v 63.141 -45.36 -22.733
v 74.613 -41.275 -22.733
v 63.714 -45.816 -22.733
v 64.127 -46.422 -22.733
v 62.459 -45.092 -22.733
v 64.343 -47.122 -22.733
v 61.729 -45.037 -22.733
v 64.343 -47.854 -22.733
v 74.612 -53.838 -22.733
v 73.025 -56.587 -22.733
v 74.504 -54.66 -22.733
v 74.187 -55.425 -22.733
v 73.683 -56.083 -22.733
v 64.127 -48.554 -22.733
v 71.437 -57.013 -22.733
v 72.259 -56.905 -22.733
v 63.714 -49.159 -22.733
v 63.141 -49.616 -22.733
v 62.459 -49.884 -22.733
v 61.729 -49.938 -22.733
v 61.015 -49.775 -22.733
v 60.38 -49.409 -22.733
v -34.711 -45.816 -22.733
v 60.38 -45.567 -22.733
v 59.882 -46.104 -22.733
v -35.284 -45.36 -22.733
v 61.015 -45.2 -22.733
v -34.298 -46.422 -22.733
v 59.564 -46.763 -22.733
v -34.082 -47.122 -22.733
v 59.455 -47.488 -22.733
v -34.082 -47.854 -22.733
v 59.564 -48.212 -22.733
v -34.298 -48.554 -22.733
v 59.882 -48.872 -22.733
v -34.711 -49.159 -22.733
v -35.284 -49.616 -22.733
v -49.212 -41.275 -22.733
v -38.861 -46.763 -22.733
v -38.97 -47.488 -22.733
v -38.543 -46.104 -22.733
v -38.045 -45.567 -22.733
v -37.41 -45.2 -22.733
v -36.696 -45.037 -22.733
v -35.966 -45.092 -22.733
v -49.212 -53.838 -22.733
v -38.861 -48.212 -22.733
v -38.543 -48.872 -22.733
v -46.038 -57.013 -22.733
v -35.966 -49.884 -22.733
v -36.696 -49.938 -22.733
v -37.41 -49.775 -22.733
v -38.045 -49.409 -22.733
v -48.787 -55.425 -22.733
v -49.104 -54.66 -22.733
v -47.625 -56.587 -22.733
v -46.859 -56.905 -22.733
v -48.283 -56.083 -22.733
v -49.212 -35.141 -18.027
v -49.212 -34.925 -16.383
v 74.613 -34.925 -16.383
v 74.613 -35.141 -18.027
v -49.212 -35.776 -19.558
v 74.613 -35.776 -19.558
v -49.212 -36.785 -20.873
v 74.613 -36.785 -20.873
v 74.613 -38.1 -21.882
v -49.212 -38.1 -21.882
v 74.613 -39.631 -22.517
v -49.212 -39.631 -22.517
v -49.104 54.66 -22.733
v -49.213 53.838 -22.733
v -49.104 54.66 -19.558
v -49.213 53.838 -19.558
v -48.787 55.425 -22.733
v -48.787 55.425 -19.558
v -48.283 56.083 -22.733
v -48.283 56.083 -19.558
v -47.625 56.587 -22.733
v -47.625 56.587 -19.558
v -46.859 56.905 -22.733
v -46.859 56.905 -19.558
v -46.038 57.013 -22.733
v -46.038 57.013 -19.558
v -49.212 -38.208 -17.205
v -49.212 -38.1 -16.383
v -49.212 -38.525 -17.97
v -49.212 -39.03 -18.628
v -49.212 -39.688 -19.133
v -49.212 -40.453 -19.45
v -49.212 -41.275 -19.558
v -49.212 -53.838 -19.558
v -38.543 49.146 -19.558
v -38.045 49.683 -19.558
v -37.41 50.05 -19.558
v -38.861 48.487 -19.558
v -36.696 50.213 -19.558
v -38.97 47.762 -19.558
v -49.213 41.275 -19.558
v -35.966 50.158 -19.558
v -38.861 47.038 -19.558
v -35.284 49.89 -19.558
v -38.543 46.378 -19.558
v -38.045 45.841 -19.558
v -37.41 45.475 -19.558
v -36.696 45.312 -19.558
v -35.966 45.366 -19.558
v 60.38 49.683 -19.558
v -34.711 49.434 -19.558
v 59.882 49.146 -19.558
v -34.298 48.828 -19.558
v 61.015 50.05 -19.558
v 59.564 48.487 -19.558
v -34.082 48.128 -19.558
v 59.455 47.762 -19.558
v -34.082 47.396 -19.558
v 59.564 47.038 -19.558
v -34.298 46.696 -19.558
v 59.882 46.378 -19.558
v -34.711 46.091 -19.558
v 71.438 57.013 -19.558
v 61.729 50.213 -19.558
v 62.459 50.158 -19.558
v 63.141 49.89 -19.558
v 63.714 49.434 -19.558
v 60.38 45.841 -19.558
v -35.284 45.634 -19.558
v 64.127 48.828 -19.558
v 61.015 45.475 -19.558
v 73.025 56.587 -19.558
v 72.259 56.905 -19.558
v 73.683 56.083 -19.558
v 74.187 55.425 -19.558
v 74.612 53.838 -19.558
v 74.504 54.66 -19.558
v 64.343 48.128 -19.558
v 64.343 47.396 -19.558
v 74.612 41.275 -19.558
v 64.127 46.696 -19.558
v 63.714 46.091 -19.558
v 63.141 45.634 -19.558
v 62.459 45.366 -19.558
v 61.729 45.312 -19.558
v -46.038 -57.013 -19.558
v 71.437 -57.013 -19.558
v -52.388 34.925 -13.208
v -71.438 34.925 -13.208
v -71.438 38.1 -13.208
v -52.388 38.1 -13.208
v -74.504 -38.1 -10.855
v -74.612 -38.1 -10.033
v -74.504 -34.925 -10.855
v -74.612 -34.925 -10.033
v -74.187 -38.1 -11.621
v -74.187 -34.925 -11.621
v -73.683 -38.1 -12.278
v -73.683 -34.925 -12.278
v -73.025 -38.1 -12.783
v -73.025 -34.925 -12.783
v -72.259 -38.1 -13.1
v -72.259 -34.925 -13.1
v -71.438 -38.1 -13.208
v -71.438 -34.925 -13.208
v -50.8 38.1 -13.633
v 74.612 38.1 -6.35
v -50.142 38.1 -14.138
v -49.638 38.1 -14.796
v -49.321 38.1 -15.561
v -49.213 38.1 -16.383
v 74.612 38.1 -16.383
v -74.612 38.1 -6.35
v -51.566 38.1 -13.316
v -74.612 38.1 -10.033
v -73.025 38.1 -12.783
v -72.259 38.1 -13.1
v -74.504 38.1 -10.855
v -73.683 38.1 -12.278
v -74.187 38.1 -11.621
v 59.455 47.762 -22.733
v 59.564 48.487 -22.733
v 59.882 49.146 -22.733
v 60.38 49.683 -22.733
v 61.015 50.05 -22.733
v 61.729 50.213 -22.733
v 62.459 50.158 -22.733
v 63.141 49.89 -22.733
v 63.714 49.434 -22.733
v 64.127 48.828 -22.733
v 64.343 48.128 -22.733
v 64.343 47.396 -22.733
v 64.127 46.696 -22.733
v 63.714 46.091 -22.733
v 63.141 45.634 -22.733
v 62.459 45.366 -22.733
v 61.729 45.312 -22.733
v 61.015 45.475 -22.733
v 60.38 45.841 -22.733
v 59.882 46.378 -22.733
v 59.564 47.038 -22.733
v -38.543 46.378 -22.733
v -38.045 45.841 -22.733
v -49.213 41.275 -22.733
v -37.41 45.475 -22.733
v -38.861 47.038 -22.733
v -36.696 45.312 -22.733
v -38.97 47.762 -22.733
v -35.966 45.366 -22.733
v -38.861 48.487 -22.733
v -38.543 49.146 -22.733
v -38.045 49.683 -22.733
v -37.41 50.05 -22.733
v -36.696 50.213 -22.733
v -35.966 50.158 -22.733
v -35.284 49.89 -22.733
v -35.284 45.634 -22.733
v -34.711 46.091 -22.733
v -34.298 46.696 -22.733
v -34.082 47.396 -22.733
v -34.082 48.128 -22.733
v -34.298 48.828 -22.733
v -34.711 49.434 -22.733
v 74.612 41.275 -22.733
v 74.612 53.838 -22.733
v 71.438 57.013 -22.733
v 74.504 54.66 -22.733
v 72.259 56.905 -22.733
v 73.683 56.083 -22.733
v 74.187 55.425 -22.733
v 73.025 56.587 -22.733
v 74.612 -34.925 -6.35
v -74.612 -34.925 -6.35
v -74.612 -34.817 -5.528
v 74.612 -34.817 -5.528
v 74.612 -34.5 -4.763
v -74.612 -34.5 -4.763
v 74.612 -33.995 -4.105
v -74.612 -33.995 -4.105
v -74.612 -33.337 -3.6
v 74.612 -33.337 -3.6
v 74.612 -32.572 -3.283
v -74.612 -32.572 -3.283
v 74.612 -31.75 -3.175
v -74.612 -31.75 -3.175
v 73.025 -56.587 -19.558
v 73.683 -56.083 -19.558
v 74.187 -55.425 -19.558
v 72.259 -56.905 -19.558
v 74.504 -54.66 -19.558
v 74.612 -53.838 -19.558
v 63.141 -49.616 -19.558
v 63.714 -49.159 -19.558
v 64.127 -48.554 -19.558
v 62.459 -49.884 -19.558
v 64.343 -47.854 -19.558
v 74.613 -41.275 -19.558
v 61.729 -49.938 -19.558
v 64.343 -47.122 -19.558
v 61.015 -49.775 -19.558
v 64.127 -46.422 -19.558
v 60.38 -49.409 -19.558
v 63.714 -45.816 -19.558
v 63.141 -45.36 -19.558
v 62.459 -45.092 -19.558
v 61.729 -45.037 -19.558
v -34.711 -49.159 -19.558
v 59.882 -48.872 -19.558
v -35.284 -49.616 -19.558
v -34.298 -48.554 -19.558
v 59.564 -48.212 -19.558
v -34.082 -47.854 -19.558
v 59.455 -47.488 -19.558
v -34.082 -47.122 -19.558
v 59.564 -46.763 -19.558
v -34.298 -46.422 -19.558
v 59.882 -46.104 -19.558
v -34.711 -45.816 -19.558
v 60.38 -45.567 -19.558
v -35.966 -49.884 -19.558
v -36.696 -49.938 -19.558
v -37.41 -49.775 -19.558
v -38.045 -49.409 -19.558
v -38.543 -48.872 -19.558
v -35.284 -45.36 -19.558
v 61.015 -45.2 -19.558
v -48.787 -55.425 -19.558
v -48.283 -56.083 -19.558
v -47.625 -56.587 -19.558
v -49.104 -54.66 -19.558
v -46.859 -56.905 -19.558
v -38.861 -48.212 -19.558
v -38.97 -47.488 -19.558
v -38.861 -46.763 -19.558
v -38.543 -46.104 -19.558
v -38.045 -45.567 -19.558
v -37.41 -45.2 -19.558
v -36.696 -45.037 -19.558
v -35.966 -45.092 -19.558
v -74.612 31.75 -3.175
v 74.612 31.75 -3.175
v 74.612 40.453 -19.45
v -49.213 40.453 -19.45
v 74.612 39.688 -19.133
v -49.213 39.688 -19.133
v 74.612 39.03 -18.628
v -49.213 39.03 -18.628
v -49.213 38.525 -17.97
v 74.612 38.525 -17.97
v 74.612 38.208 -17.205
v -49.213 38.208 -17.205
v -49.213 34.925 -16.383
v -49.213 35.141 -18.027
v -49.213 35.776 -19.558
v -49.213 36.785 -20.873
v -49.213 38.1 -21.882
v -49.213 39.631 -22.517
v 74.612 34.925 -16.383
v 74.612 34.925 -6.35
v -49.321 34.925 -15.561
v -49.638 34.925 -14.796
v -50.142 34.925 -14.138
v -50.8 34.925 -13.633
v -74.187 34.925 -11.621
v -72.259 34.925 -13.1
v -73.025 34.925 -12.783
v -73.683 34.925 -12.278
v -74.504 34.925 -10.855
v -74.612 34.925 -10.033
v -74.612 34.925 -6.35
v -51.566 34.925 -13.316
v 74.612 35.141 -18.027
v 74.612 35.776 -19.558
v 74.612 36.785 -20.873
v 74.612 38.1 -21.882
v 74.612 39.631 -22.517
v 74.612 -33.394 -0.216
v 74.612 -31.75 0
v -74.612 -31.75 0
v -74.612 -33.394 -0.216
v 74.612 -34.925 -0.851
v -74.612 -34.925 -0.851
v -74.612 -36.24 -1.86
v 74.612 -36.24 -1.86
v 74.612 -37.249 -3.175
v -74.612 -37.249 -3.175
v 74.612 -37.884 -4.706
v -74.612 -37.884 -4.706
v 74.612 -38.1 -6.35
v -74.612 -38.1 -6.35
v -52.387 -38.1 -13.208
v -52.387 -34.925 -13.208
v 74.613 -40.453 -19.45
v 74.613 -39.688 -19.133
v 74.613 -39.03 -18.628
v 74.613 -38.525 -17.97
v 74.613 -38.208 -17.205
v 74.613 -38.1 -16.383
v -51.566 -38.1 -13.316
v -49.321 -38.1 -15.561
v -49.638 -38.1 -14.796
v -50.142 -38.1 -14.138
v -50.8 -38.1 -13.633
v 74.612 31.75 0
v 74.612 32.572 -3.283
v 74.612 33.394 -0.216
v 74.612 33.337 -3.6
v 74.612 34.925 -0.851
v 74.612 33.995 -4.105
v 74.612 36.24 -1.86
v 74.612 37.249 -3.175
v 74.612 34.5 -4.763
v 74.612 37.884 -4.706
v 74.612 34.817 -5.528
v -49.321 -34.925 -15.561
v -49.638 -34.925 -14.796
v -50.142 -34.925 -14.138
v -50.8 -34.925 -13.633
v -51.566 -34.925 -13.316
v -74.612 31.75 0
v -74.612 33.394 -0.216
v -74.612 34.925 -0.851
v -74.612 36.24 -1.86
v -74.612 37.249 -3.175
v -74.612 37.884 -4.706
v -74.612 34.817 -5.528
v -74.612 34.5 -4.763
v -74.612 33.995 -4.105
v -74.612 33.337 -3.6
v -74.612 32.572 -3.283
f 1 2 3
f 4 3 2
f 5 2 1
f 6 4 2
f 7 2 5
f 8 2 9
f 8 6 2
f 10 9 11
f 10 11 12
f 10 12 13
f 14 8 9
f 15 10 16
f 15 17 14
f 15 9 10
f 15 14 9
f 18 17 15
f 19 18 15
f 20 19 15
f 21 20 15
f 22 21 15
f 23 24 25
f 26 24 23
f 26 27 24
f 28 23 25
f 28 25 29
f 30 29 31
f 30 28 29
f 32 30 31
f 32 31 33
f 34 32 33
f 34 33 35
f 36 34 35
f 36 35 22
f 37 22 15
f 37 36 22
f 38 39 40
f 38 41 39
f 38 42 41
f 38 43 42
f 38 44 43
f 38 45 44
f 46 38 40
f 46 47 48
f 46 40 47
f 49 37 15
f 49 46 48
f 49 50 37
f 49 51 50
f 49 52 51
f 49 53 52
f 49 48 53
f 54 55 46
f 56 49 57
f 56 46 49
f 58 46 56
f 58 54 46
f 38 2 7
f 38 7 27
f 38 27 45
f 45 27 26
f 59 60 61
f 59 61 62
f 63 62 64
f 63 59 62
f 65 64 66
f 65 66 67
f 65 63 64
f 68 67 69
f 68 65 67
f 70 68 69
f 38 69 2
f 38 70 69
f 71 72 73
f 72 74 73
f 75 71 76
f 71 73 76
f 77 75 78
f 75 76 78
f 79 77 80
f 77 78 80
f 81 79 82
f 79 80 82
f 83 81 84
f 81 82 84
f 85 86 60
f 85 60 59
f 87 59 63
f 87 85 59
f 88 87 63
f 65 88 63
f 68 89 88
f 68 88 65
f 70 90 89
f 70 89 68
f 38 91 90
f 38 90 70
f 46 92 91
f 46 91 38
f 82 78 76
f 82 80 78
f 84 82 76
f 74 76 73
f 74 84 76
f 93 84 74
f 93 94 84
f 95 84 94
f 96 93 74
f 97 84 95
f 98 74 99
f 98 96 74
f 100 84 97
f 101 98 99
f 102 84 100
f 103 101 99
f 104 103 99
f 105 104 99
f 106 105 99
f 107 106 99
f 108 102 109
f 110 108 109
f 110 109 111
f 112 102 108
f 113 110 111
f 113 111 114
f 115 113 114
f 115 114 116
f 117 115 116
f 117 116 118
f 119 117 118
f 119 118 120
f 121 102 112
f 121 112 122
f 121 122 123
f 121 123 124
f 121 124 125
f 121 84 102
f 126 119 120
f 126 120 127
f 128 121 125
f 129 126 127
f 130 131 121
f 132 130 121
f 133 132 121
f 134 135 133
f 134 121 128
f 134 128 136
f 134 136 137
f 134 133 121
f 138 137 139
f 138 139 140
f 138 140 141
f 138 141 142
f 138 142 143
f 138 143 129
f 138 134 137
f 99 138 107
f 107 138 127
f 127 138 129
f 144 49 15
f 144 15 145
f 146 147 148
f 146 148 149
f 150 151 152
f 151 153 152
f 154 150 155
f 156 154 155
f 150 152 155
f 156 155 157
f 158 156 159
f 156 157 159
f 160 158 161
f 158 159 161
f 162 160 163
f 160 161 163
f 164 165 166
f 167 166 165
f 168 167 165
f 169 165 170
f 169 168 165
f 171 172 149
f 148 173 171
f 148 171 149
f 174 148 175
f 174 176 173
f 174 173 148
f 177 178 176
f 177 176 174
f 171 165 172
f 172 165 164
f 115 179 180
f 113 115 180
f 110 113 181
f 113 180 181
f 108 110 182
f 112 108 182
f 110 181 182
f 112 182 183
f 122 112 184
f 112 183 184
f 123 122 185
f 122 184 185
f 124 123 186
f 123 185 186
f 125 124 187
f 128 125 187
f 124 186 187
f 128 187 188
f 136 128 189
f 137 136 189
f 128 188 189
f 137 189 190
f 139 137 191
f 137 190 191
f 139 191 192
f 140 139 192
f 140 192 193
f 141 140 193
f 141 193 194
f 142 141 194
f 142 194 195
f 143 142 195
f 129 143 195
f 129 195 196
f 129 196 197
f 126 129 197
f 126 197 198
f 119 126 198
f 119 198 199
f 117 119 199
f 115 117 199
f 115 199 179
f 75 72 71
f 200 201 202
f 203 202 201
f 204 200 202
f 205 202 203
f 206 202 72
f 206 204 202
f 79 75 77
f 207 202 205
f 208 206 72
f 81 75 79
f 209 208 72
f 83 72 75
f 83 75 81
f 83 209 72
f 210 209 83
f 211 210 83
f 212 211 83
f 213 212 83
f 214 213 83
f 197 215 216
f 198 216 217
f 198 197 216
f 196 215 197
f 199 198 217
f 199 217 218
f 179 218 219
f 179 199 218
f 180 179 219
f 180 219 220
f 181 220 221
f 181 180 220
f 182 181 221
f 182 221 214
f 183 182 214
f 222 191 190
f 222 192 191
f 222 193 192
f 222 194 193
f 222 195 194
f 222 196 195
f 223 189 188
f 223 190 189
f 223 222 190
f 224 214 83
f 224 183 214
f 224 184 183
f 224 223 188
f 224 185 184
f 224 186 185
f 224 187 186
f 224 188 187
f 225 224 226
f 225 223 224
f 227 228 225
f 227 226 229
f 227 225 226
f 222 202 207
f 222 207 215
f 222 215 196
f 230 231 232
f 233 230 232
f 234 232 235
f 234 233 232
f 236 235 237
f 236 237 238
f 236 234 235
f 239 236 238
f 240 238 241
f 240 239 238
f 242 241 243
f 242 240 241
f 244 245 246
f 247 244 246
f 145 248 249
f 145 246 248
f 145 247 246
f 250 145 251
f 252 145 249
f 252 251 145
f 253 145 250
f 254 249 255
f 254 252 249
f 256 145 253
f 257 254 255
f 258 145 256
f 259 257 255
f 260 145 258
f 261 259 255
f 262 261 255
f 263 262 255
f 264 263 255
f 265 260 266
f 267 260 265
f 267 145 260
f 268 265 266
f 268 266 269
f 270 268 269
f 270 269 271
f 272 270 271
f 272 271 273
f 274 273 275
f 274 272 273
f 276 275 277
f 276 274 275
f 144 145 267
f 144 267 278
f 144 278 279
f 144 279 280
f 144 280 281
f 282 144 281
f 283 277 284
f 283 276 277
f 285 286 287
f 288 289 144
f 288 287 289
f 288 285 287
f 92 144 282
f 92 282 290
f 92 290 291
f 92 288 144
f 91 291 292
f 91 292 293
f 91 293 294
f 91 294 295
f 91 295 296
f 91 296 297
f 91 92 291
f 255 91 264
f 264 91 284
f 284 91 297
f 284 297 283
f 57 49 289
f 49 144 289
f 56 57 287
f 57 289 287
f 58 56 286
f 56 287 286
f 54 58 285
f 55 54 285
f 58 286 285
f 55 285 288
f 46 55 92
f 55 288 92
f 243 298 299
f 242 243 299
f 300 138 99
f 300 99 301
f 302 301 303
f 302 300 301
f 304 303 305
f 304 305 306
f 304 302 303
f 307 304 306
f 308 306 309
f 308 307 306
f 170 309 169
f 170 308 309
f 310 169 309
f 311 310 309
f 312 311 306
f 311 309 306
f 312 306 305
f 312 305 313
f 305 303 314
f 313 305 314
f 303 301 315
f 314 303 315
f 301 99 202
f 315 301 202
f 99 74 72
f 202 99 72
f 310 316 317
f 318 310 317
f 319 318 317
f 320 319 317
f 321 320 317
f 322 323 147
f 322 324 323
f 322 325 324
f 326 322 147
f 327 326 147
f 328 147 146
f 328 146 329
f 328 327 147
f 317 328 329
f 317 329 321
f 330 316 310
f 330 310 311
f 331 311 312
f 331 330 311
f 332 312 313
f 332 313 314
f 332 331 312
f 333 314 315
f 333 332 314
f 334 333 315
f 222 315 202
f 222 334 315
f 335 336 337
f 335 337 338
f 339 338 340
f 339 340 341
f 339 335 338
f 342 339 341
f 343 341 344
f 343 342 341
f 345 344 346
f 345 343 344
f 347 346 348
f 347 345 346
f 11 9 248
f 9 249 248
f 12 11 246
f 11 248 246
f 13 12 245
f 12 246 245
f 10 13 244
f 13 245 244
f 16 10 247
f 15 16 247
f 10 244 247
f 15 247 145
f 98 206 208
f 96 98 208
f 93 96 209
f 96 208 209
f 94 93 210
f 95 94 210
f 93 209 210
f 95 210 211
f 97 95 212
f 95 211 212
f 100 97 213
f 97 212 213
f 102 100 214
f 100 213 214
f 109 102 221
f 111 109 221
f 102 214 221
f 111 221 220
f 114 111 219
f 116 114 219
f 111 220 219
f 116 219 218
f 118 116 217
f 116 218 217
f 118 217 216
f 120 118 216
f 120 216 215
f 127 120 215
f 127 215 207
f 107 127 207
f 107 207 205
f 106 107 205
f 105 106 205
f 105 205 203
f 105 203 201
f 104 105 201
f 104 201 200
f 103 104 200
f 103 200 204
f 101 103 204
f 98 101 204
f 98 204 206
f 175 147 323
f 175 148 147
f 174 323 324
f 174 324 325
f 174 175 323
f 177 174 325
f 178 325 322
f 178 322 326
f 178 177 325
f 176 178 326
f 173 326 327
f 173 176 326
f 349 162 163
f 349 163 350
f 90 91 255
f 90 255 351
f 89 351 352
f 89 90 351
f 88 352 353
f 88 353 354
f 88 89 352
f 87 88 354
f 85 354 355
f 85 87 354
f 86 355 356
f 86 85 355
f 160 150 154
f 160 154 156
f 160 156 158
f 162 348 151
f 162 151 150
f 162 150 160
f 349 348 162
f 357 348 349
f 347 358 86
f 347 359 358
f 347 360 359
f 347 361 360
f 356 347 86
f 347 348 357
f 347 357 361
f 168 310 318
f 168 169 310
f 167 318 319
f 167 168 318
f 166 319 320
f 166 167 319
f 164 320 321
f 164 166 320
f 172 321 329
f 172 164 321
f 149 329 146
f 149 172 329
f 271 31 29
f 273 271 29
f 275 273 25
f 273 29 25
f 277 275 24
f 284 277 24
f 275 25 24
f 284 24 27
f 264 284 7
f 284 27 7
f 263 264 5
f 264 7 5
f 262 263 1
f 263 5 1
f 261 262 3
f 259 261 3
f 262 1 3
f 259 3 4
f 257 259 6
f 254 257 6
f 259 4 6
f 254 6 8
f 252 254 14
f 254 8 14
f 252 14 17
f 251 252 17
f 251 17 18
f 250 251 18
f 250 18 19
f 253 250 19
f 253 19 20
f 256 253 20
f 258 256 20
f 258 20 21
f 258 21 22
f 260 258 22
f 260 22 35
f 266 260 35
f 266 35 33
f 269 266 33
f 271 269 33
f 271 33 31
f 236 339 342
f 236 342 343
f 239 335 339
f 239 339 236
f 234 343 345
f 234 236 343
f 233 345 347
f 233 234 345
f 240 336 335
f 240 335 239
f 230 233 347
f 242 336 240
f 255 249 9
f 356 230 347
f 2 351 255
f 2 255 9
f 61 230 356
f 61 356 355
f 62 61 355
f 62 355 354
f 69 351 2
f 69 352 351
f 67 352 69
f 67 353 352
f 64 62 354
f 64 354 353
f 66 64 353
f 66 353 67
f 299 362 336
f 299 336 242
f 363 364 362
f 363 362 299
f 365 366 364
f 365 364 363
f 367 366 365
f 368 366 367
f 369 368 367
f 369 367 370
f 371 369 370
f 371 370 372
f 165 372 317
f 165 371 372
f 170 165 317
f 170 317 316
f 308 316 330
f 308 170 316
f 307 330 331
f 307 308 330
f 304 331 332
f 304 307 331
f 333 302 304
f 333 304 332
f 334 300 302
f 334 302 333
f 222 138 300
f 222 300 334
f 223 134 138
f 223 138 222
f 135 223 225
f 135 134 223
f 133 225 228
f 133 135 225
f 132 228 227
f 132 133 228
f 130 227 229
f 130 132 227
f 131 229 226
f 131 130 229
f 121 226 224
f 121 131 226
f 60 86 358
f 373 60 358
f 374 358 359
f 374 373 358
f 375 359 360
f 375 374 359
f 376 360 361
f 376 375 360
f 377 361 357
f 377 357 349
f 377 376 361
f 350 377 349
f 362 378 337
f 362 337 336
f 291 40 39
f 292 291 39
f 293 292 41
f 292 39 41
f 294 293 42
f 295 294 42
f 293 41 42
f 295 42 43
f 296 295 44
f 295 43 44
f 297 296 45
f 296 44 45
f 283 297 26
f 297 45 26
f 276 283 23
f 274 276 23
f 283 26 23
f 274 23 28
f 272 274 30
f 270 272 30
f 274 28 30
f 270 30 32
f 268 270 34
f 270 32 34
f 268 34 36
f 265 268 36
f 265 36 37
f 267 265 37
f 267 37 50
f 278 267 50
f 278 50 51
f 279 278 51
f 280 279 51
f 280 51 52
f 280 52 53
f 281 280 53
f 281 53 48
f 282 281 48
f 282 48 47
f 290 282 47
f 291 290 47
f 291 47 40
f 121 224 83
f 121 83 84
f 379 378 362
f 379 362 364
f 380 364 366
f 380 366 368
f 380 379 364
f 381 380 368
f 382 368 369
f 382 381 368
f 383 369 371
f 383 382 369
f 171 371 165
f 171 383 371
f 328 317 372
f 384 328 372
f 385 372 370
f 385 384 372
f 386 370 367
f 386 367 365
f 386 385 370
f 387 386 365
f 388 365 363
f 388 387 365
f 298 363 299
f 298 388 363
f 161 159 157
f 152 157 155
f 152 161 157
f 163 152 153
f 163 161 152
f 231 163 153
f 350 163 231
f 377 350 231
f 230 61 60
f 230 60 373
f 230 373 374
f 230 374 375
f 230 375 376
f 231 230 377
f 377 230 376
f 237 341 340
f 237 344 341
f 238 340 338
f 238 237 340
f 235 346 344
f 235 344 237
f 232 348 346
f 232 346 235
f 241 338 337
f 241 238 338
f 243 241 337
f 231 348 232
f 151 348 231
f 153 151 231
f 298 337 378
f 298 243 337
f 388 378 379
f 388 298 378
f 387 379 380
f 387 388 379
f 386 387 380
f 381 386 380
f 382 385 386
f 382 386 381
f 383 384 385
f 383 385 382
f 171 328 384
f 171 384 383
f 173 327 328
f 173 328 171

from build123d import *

# Parameters (mm, degrees)
SKETCH1_W                        = 149.225
SKETCH1_H                        = 76.2
BASE_FLANGE1_DEPTH               = 3.175
EDGE_FLANGE1_STRIP_W             = 19.05
EDGE_FLANGE1_STRIP_H             = 3.175
EDGE_FLANGE1_STRIP_CUT_DEPTH     = 149.225
EDGE_FLANGE1_STRIP_2_W           = 19.05
EDGE_FLANGE1_STRIP_2_H           = 3.175
EDGE_FLANGE1_STRIP_CUT_2_DEPTH   = 149.225
EDGE_FLANGE1_DEPTH               = 149.225
EDGE_FLANGE1_BEND_DEPTH          = 149.225
SKETCH17_W                       = 25.4
SKETCH17_H                       = 9.525
CUT_EXTRUDE1_DEPTH               = 110.04244332
EDGE_FLANGE2_STRIP_W             = 19.05
EDGE_FLANGE2_STRIP_H             = 3.175
EDGE_FLANGE2_STRIP_CUT_DEPTH     = 123.825
EDGE_FLANGE2_STRIP_2_W           = 19.05
EDGE_FLANGE2_STRIP_2_H           = 3.175
EDGE_FLANGE2_STRIP_CUT_2_DEPTH   = 123.825
EDGE_FLANGE2_DEPTH               = 123.825
EDGE_FLANGE2_BEND_DEPTH          = 123.825
SKETCH18_R                       = 2.3876
CUT_EXTRUDE2_DEPTH               = 97.614069214
LPATTERN1_COUNT                  = 2
LPATTERN1_PITCH                  = 98.425
LPATTERN1_COUNT_DIR2             = 2
LPATTERN1_PITCH_DIR2             = 95.25
FILLET1_R                        = 3.175
F_10_0_1935_DIAMETER_HOLE1_D     = 4.9149
F_10_0_1935_DIAMETER_HOLE1_DEPTH = 3.175


# Sheet-metal steps are written as plain solids
with BuildPart() as part:
    # Sketch1 → Base-Flange1 (new body)
    with BuildSketch(Plane.XY):
        Rectangle(SKETCH1_W, SKETCH1_H)
    extrude(amount=-BASE_FLANGE1_DEPTH)

    # Edge-Flange1 strip (across the edge) → Edge-Flange1 strip cut (cut)
    with BuildSketch(Plane(origin=(74.6125, -38.1, -3.175), x_dir=(0, 1, 0), z_dir=(-1, 0, 0))):
        with Locations((-3.175, -1.5875)):
            Rectangle(EDGE_FLANGE1_STRIP_W, EDGE_FLANGE1_STRIP_H)
    extrude(amount=EDGE_FLANGE1_STRIP_CUT_DEPTH, mode=Mode.SUBTRACT)

    # Edge-Flange1 strip 2 (across the edge) → Edge-Flange1 strip cut 2 (cut)
    with BuildSketch(Plane(origin=(-74.6125, 38.1, -3.175), x_dir=(0, -1, 0), z_dir=(1, 0, 0))):
        with Locations((-3.175, -1.5875)):
            Rectangle(EDGE_FLANGE1_STRIP_2_W, EDGE_FLANGE1_STRIP_2_H)
    extrude(amount=EDGE_FLANGE1_STRIP_CUT_2_DEPTH, mode=Mode.SUBTRACT)

    # Edge-Flange1 section (across the edge) → Edge-Flange1 (add)
    with BuildSketch(Plane(origin=(74.6125, -38.1, -3.175), x_dir=(0, 1, 0), z_dir=(-1, 0, 0))):
        with BuildLine():
            Line((0, 3.175), (0, 19.558))
            Line((0, 19.558), (3.175, 19.558))
            Line((3.175, 19.558), (3.175, 3.175))
            ThreePointArc((3.175, 3.175), (4.10493597, 0.92993597), (6.35, 0))
            Line((6.35, 0), (6.35, -3.175))
            ThreePointArc((6.35, -3.175), (1.859871939, -1.315128061), (0, 3.175))
        make_face()
    extrude(amount=EDGE_FLANGE1_DEPTH)

    # Edge-Flange1 section 2 (across the edge) → Edge-Flange1 bend (add)
    with BuildSketch(Plane(origin=(-74.6125, 38.1, -3.175), x_dir=(0, -1, 0), z_dir=(1, 0, 0))):
        with BuildLine():
            Line((0, 3.175), (0, 19.558))
            Line((0, 19.558), (3.175, 19.558))
            Line((3.175, 19.558), (3.175, 3.175))
            ThreePointArc((3.175, 3.175), (4.10493597, 0.92993597), (6.35, 0))
            Line((6.35, 0), (6.35, -3.175))
            ThreePointArc((6.35, -3.175), (1.859871939, -1.315128061), (0, 3.175))
        make_face()
    extrude(amount=EDGE_FLANGE1_BEND_DEPTH)

    # Sketch17 → Cut-Extrude1 (cut, through all)
    with BuildSketch(Plane.XZ.offset(38.1)):
        with Locations((-61.9125, -17.9705)):
            Rectangle(SKETCH17_W, SKETCH17_H)
    extrude(amount=-CUT_EXTRUDE1_DEPTH, mode=Mode.SUBTRACT)

    # Edge-Flange2 strip (across the edge) → Edge-Flange2 strip cut (cut)
    with BuildSketch(Plane(origin=(-49.2125, -38.1, -22.733), x_dir=(0, 0, 1), z_dir=(1, 0, 0))):
        with Locations((-3.175, -1.5875)):
            Rectangle(EDGE_FLANGE2_STRIP_W, EDGE_FLANGE2_STRIP_H)
    extrude(amount=EDGE_FLANGE2_STRIP_CUT_DEPTH, mode=Mode.SUBTRACT)

    # Edge-Flange2 strip 2 (across the edge) → Edge-Flange2 strip cut 2 (cut)
    with BuildSketch(Plane(origin=(74.6125, 38.1, -22.733), x_dir=(0, 0, 1), z_dir=(-1, 0, 0))):
        with Locations((-3.175, -1.5875)):
            Rectangle(EDGE_FLANGE2_STRIP_2_W, EDGE_FLANGE2_STRIP_2_H)
    extrude(amount=EDGE_FLANGE2_STRIP_CUT_2_DEPTH, mode=Mode.SUBTRACT)

    # Edge-Flange2 section (across the edge) → Edge-Flange2 (add)
    with BuildSketch(Plane(origin=(-49.2125, -38.1, -22.733), x_dir=(0, 0, 1), z_dir=(1, 0, 0))):
        with BuildLine():
            Line((0, 3.175), (0, 18.91284))
            Line((0, 18.91284), (3.175, 18.91284))
            Line((3.175, 18.91284), (3.175, 3.175))
            ThreePointArc((3.175, 3.175), (4.10493597, 0.92993597), (6.35, 0))
            Line((6.35, 0), (6.35, -3.175))
            ThreePointArc((6.35, -3.175), (1.859871939, -1.315128061), (0, 3.175))
        make_face()
    extrude(amount=EDGE_FLANGE2_DEPTH)

    # Edge-Flange2 section 2 (across the edge) → Edge-Flange2 bend (add)
    with BuildSketch(Plane(origin=(74.6125, 38.1, -22.733), x_dir=(0, 0, 1), z_dir=(-1, 0, 0))):
        with BuildLine():
            Line((0, 3.175), (0, 18.91284))
            Line((0, 18.91284), (3.175, 18.91284))
            Line((3.175, 18.91284), (3.175, 3.175))
            ThreePointArc((3.175, 3.175), (4.10493597, 0.92993597), (6.35, 0))
            Line((6.35, 0), (6.35, -3.175))
            ThreePointArc((6.35, -3.175), (1.859871939, -1.315128061), (0, 3.175))
        make_face()
    extrude(amount=EDGE_FLANGE2_BEND_DEPTH)

    # Sketch18 → Cut-Extrude2 (cut, through all)
    with BuildSketch(Plane(origin=(0, 0, -22.733), x_dir=(-1, 0, 0), z_dir=(0, 0, -1))):
        with Locations((-61.9125, -47.48784)):
            Circle(SKETCH18_R)
    cut_extrude2 = extrude(amount=-CUT_EXTRUDE2_DEPTH, mode=Mode.SUBTRACT)

    # LPattern1: Cut-Extrude2 2 × 2
    with Locations(*[(-i * LPATTERN1_PITCH, j * LPATTERN1_PITCH_DIR2, 0) for i in range(LPATTERN1_COUNT) for j in range(LPATTERN1_COUNT_DIR2) if (i, j) != (0, 0)]):
        add(cut_extrude2, mode=Mode.SUBTRACT)

    # Fillet1
    fillet1_edges = [part.edges().sort_by_distance(p)[0] for p in [
        (-49.2125, -36.5125, -13.208),
        (-49.2125, 36.5125, -13.208),
        (-74.6125, -36.5125, -13.208),
        (-74.6125, 36.5125, -13.208),
        (-49.2125, 57.01284, -21.1455),
        (74.6125, 57.01284, -21.1455),
        (74.6125, -57.01284, -21.1455),
        (-49.2125, -57.01284, -21.1455),
    ]]
    fillet(fillet1_edges, radius=FILLET1_R)

    # #10 (0.1935) Diameter Hole1
    with Locations(Plane.XY.offset(-19.558)):
        with Locations((-36.5125, 47.76216), (61.9125, 47.76216), (61.9125, -47.48784), (-36.5125, -47.48784)):
            Hole(F_10_0_1935_DIAMETER_HOLE1_D / 2, depth=F_10_0_1935_DIAMETER_HOLE1_DEPTH)


solid = part.part
